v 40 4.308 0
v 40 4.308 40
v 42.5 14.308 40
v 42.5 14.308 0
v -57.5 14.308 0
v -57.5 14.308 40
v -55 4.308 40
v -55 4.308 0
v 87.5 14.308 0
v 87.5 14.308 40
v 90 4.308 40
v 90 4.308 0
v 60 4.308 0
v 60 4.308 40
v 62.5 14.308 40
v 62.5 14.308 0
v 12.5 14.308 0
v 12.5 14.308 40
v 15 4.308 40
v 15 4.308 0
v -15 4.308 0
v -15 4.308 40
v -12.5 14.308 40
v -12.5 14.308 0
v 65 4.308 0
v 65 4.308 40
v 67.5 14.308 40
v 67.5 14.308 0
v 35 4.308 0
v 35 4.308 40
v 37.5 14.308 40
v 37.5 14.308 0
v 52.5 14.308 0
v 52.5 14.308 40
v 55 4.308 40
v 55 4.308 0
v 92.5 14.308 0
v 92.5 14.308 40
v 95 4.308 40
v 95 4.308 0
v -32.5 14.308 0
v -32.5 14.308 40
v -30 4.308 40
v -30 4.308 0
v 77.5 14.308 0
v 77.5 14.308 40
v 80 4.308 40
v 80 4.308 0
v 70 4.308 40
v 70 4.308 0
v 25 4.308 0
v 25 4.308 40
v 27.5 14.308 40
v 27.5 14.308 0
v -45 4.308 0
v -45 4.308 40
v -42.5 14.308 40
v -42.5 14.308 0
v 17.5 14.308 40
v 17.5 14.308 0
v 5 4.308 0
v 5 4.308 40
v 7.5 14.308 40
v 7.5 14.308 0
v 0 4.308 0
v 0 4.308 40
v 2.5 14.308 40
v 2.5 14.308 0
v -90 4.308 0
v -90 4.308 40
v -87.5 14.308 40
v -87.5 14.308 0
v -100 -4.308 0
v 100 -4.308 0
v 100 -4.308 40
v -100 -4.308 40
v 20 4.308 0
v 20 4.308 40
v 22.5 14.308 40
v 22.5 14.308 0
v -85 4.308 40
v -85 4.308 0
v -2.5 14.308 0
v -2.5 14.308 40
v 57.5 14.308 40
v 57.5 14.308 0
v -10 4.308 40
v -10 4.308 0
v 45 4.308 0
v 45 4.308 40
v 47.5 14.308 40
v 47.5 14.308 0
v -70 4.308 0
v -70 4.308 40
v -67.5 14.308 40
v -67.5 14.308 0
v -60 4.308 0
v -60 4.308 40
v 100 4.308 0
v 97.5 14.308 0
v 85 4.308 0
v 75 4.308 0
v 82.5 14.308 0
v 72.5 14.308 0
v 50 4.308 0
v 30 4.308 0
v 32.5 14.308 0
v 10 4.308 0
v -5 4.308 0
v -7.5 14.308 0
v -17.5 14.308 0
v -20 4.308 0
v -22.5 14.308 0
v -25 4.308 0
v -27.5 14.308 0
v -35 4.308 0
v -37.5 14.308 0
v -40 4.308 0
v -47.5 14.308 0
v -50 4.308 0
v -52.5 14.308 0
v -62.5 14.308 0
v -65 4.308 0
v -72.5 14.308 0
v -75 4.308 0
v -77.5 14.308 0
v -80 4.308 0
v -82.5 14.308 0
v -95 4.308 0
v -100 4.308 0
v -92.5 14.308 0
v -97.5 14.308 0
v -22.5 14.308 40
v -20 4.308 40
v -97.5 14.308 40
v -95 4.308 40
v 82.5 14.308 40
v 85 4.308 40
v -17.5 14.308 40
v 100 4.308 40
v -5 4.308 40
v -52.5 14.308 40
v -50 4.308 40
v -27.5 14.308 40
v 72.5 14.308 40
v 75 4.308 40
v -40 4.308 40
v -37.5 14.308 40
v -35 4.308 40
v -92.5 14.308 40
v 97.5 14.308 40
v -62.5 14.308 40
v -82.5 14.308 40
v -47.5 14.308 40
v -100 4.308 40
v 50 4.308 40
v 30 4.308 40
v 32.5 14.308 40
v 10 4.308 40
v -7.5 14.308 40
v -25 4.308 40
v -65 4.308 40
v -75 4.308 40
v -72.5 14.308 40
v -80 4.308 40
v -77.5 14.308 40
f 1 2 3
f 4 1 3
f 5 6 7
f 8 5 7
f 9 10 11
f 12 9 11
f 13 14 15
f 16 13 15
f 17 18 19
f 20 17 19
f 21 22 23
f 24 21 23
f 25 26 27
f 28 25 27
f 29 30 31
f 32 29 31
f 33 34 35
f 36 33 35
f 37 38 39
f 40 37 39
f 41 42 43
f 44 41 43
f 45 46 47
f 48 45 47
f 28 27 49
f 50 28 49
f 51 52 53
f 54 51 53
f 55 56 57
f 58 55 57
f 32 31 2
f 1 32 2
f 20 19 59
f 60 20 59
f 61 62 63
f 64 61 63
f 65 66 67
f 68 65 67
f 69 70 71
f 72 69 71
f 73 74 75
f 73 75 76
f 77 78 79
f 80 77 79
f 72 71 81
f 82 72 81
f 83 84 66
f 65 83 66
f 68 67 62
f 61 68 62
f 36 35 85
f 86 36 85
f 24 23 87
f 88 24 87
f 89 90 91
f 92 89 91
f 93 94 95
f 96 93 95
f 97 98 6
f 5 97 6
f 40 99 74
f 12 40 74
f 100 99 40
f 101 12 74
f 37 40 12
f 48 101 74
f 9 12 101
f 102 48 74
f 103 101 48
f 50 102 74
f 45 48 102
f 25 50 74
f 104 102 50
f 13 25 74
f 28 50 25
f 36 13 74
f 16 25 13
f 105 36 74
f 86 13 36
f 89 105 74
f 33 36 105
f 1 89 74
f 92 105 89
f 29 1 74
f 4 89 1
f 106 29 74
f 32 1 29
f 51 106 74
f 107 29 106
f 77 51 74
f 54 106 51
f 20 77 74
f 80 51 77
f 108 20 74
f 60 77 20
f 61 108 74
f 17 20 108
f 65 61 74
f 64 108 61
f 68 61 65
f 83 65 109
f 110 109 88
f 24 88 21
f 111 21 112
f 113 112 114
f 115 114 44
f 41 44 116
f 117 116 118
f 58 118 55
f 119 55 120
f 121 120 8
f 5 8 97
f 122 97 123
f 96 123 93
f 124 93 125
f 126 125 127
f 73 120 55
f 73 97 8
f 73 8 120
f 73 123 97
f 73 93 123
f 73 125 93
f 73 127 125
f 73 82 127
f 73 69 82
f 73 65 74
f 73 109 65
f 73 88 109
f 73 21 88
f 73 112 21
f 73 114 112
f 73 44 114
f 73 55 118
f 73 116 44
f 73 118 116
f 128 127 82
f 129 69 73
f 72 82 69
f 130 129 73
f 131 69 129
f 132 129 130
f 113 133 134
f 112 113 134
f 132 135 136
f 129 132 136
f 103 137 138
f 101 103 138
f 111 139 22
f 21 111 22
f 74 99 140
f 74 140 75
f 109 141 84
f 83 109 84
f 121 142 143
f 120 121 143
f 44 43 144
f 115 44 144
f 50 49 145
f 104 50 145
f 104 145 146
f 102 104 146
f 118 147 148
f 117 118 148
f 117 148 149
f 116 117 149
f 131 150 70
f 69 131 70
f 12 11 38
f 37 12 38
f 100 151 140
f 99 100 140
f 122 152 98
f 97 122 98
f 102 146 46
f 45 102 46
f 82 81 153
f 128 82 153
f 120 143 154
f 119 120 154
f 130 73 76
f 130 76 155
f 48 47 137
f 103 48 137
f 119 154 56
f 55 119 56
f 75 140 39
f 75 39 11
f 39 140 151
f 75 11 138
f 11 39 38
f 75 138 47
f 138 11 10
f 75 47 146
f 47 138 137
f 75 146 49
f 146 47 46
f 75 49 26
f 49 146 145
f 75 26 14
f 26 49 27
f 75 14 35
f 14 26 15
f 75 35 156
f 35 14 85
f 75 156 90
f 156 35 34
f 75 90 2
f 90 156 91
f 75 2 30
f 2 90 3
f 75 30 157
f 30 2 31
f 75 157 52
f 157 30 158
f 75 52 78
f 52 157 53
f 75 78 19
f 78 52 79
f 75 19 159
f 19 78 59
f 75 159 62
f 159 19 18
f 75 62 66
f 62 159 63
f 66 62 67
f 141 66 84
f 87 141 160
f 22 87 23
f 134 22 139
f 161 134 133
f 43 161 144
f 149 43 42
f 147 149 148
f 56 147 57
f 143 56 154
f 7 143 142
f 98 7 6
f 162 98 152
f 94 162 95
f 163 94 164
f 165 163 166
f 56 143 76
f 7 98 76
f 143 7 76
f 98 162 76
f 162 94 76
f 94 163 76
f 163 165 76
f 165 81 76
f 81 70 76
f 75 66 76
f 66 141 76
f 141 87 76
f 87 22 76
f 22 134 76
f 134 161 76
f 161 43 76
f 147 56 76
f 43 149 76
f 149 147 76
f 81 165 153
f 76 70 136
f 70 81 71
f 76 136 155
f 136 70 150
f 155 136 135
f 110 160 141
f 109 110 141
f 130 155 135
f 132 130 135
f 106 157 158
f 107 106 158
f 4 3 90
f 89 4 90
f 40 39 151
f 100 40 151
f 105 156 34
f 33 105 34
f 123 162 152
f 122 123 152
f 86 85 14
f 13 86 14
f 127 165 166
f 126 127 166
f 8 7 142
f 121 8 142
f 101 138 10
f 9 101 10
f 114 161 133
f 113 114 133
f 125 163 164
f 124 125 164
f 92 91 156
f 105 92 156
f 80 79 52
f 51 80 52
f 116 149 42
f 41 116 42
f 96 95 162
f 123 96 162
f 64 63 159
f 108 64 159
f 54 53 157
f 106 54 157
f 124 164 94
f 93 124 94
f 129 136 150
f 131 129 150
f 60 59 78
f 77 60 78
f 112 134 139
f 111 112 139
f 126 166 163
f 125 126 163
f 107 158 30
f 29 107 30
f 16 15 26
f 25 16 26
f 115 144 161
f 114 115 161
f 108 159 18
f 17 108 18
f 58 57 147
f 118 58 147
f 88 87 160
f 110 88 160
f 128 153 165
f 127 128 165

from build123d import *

# Parameters (mm, degrees)
BOSS_EXTRUDE1_DEPTH = 40


with BuildPart() as part:
    # Sketch1 → Boss-Extrude1 (new body)
    with BuildSketch(Plane.XY):
        Polygon((-100, 4.308297624), (-97.5, 14.308297624), (-95, 4.308297624), (-92.5, 14.308297624), (-90, 4.308297624), (-87.5, 14.308297624), (-85, 4.308297624), (-82.5, 14.308297624), (-80, 4.308297624), (-77.5, 14.308297624), (-75, 4.308297624), (-72.5, 14.308297624), (-70, 4.308297624), (-67.5, 14.308297624), (-65, 4.308297624), (-62.5, 14.308297624), (-60, 4.308297624), (-57.5, 14.308297624), (-55, 4.308297624), (-52.5, 14.308297624), (-50, 4.308297624), (-47.5, 14.308297624), (-45, 4.308297624), (-42.5, 14.308297624), (-40, 4.308297624), (-37.5, 14.308297624), (-35, 4.308297624), (-32.5, 14.308297624), (-30, 4.308297624), (-27.5, 14.308297624), (-25, 4.308297624), (-22.5, 14.308297624), (-20, 4.308297624), (-17.5, 14.308297624), (-15, 4.308297624), (-12.5, 14.308297624), (-10, 4.308297624), (-7.5, 14.308297624), (-5, 4.308297624), (-2.5, 14.308297624), (0, 4.308297624), (2.5, 14.308297624), (5, 4.308297624), (7.5, 14.308297624), (10, 4.308297624), (12.5, 14.308297624), (15, 4.308297624), (17.5, 14.308297624), (20, 4.308297624), (22.5, 14.308297624), (25, 4.308297624), (27.5, 14.308297624), (30, 4.308297624), (32.5, 14.308297624), (35, 4.308297624), (37.5, 14.308297624), (40, 4.308297624), (42.5, 14.308297624), (45, 4.308297624), (47.5, 14.308297624), (50, 4.308297624), (52.5, 14.308297624), (55, 4.308297624), (57.5, 14.308297624), (60, 4.308297624), (62.5, 14.308297624), (65, 4.308297624), (67.5, 14.308297624), (70, 4.308297624), (72.5, 14.308297624), (75, 4.308297624), (77.5, 14.308297624), (80, 4.308297624), (82.5, 14.308297624), (85, 4.308297624), (87.5, 14.308297624), (90, 4.308297624), (92.5, 14.308297624), (95, 4.308297624), (97.5, 14.308297624), (100, 4.308297624), (100, -4.308297624), (-100, -4.308297624), align=None)
    extrude(amount=BOSS_EXTRUDE1_DEPTH)


solid = part.part
